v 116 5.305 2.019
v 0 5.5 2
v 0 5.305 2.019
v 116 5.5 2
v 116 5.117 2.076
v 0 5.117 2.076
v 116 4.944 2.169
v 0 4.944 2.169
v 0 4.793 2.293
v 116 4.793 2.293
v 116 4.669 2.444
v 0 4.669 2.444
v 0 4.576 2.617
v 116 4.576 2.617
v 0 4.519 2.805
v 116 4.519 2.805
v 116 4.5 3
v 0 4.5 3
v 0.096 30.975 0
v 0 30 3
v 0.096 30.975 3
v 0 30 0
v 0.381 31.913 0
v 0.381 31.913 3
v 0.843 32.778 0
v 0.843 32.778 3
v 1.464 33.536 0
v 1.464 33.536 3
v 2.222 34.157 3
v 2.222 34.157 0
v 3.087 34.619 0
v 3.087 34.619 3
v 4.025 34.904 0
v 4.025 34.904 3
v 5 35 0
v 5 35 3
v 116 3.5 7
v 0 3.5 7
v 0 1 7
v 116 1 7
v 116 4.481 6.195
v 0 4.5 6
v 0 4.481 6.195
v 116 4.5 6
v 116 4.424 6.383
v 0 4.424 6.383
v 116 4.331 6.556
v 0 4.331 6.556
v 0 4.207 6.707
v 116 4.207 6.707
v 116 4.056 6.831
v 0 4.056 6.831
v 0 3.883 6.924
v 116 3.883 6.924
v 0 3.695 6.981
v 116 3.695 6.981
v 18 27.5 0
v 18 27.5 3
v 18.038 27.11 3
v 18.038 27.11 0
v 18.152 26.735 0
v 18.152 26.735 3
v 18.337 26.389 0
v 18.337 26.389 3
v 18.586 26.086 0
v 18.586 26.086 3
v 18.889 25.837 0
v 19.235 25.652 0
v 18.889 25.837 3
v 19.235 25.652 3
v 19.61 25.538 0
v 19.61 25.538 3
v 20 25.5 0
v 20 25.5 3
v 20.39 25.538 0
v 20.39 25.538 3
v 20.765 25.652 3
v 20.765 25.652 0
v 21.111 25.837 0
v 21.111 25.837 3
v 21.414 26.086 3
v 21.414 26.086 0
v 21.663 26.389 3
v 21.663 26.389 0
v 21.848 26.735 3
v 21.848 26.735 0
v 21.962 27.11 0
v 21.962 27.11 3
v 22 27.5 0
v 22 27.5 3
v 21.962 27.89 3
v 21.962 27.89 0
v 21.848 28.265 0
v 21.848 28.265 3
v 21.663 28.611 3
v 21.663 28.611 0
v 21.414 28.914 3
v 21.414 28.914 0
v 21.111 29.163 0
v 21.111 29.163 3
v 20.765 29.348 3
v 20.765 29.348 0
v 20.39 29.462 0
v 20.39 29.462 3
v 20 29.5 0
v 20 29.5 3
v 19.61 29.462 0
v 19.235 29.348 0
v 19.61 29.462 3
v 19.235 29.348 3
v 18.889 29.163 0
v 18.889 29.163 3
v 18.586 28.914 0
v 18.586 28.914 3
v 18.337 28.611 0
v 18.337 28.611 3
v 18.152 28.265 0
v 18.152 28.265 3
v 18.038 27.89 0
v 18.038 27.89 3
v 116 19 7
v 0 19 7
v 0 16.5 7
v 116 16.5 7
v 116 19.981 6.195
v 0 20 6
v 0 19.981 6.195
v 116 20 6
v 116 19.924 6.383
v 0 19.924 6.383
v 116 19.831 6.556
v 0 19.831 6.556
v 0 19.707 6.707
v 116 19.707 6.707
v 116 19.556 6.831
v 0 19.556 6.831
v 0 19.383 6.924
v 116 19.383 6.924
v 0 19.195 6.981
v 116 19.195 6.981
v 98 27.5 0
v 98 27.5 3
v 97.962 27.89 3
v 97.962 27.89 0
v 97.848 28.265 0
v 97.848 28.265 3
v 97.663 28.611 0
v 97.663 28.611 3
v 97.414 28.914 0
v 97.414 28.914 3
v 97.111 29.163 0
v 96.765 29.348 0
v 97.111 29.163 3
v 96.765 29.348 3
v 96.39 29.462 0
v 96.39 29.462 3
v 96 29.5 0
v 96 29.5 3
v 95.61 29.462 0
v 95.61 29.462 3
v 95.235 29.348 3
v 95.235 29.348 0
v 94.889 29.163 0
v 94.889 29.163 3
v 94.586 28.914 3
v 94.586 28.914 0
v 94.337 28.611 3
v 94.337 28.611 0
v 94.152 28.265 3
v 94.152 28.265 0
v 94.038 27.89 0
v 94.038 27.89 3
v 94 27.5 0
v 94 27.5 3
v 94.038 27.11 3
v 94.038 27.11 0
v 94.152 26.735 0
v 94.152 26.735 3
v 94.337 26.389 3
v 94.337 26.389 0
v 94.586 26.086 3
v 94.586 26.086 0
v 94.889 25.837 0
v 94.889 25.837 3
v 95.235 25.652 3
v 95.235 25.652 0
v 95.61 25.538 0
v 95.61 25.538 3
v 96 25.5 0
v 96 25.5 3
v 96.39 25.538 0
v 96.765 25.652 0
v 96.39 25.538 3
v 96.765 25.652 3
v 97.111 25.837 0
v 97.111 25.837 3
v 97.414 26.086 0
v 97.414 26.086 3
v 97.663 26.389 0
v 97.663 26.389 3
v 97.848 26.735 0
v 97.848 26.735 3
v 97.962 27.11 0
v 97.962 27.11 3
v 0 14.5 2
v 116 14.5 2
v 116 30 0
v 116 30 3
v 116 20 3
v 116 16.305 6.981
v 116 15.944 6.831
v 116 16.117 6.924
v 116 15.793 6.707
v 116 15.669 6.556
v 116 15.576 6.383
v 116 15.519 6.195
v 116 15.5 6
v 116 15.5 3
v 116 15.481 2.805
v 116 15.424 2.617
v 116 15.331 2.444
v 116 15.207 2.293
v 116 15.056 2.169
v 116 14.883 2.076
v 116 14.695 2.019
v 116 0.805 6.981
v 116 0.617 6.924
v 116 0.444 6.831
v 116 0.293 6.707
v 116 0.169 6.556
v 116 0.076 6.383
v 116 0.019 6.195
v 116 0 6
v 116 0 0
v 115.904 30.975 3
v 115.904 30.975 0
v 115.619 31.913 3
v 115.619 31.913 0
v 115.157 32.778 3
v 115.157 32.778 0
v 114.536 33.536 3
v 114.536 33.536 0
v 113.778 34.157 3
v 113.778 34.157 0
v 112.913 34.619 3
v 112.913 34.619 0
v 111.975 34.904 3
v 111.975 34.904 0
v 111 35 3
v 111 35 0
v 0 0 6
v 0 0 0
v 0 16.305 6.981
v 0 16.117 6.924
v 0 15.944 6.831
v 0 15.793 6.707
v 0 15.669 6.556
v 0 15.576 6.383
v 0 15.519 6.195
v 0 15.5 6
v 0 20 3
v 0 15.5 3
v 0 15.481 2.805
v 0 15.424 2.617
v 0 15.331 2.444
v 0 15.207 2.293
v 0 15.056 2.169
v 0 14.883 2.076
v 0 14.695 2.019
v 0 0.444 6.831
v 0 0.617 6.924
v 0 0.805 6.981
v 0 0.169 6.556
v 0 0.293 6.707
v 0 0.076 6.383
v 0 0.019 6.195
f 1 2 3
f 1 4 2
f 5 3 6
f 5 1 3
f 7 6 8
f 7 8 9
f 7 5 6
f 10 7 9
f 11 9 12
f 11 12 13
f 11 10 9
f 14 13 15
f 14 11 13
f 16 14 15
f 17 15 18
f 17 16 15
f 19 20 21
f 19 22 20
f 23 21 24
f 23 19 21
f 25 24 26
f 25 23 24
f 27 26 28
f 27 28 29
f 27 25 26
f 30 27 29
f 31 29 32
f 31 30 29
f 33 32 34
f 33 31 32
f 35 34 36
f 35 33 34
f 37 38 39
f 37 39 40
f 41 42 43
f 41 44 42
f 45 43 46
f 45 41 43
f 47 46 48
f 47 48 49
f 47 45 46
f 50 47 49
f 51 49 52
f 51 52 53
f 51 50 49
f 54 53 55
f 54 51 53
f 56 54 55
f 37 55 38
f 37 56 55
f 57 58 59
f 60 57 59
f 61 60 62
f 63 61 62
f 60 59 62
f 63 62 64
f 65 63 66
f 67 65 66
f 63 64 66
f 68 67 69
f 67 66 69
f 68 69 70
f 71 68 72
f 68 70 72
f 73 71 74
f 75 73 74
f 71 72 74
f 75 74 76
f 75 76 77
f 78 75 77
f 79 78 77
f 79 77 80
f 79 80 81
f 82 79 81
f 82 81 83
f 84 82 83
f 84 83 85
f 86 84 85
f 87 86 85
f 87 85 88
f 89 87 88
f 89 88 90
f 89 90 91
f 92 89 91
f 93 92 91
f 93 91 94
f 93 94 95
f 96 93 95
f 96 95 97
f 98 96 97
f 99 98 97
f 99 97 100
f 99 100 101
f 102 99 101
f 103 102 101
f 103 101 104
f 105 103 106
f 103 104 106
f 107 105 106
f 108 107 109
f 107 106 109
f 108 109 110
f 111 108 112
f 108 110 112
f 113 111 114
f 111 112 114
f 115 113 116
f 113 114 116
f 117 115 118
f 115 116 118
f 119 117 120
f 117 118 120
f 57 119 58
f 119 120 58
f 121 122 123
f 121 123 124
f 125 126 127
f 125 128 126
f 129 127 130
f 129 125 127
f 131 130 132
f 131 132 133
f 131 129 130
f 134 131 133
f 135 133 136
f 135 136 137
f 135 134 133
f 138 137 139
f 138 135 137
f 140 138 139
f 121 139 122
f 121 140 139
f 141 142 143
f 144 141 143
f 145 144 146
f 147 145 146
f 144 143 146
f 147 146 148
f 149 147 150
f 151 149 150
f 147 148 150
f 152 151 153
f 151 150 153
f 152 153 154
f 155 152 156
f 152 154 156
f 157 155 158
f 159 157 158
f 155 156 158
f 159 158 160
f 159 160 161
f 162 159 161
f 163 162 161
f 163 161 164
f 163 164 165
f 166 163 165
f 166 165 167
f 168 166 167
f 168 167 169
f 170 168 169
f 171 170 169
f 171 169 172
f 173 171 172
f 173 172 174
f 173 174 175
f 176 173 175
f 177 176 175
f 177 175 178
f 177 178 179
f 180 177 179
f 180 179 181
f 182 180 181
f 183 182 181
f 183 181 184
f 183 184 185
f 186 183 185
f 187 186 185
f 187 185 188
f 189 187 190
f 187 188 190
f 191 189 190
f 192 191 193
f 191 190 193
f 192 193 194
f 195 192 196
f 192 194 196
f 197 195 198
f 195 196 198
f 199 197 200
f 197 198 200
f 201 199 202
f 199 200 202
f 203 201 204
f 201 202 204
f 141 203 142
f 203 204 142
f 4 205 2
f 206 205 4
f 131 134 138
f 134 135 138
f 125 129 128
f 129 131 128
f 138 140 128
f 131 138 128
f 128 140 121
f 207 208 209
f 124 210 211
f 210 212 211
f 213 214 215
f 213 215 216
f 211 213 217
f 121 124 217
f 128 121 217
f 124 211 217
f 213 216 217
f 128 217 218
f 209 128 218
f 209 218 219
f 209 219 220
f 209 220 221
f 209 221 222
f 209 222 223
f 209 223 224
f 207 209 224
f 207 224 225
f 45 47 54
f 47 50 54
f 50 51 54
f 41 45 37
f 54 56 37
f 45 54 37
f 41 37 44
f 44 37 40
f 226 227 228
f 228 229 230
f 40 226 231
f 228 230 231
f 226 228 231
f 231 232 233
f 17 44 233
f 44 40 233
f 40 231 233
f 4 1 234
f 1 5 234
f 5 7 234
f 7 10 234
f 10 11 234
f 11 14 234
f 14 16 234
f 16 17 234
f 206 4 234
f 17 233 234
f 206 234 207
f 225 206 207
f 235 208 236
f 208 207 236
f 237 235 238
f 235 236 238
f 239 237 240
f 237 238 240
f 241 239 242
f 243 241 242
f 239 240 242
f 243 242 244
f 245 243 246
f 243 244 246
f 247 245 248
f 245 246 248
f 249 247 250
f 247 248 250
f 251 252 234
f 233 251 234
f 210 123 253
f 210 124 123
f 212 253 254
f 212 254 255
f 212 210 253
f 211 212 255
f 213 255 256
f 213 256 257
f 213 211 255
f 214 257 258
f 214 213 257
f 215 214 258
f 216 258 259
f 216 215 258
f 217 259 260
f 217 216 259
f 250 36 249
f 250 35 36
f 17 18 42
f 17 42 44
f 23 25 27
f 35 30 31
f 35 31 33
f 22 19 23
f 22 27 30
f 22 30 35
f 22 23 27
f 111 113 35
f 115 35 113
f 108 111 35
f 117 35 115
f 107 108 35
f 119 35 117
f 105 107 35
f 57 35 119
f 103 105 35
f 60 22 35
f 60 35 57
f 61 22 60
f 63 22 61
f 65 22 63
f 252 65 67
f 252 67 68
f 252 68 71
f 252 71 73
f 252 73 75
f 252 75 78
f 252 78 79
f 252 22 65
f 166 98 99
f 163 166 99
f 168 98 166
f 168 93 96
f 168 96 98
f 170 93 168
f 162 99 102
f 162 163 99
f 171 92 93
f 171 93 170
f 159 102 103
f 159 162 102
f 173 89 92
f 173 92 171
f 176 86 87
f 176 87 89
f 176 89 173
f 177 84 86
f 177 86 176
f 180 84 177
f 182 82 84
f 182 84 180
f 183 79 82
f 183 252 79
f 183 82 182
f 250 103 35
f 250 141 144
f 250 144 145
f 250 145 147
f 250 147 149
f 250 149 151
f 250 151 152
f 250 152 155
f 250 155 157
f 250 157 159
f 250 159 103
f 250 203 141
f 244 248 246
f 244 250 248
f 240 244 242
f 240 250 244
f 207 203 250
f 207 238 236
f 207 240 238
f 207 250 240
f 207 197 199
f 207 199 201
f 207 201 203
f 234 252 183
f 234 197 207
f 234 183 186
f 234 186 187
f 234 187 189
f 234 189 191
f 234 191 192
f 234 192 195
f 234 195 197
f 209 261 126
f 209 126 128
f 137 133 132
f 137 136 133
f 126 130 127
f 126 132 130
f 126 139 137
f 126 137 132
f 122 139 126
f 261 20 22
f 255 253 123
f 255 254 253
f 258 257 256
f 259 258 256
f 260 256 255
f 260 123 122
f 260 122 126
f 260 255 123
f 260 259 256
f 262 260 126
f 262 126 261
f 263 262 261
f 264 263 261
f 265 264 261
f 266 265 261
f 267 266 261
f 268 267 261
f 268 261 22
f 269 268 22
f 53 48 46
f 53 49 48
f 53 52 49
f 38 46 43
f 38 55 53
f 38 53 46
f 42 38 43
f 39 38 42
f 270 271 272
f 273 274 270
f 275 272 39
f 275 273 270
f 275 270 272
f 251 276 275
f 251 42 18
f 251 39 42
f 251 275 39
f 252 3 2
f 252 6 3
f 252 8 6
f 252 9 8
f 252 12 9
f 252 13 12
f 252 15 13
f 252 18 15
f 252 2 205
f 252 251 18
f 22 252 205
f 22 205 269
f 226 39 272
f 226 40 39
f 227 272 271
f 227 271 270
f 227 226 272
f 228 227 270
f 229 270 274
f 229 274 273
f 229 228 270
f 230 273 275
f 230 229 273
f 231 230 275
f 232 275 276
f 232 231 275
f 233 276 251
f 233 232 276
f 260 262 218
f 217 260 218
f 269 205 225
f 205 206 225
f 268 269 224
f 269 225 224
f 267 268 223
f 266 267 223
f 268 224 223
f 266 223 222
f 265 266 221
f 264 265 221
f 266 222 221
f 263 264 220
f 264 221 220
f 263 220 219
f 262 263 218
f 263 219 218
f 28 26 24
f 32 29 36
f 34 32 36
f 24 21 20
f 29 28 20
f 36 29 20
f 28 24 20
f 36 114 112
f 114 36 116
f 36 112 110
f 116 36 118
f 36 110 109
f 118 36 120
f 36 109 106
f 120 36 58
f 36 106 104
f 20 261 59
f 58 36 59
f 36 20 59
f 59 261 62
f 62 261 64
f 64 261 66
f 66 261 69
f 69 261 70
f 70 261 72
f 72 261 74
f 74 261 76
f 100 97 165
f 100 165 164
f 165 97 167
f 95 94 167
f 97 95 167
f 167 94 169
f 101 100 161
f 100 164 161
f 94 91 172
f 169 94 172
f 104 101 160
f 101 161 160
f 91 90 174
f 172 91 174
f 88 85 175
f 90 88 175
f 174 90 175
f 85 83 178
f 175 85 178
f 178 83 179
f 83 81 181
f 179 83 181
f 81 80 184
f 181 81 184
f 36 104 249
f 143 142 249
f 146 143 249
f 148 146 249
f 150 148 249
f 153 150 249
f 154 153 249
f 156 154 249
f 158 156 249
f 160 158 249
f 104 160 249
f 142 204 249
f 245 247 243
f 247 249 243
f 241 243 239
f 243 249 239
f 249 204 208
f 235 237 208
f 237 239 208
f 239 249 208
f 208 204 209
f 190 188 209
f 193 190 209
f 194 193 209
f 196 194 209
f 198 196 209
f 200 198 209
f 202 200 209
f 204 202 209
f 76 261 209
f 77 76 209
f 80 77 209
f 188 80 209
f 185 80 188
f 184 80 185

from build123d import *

# Parameters (mm, degrees)
SKETCH1_W           = 116
SKETCH1_H           = 20
BOSS_EXTRUDE1_DEPTH = 2
SKETCH2_W           = 116
SKETCH2_H           = 4.5
BOSS_EXTRUDE2_DEPTH = 5
FILLET1_R           = 1
SKETCH3_W           = 116
SKETCH3_H           = 3
BOSS_EXTRUDE3_DEPTH = 15
FILLET2_R           = 5
SKETCH4_R           = 2
CUT_EXTRUDE1_DEPTH  = 15


with BuildPart() as part:
    # Sketch1 → Boss-Extrude1 (new body)
    with BuildSketch(Plane.XY):
        with Locations((58, 10)):
            Rectangle(SKETCH1_W, SKETCH1_H)
    extrude(amount=BOSS_EXTRUDE1_DEPTH)

    # Sketch2 → Boss-Extrude2 (add)
    with BuildSketch(Plane.XY.offset(2)):
        with Locations((58, 17.75)):
            Rectangle(SKETCH2_W, SKETCH2_H)
        with Locations((58, 2.25)):
            Rectangle(SKETCH2_W, SKETCH2_H)
    extrude(amount=BOSS_EXTRUDE2_DEPTH)

    # Fillet1
    fillet1_edges = [part.edges().sort_by_distance(p)[0] for p in [
        (58, 15.5, 2),
        (58, 15.5, 7),
        (58, 20, 7),
        (58, 4.5, 2),
        (58, 0, 7),
        (58, 4.5, 7),
    ]]
    fillet(fillet1_edges, radius=FILLET1_R)

    # Sketch3 → Boss-Extrude3 (add)
    with BuildSketch(Plane(origin=(0, 20, 0), x_dir=(1, 0, 0), z_dir=(0, 1, 0))):
        with Locations((58, -1.5)):
            Rectangle(SKETCH3_W, SKETCH3_H)
    extrude(amount=BOSS_EXTRUDE3_DEPTH)

    # Fillet2
    fillet2_edges = [part.edges().sort_by_distance(p)[0] for p in [
        (0, 35, 1.5),
        (116, 35, 1.5),
    ]]
    fillet(fillet2_edges, radius=FILLET2_R)

    # Sketch4 → Cut-Extrude1 (cut)
    with BuildSketch(Plane.XY.offset(3)):
        with Locations((96, 27.5)):
            Circle(SKETCH4_R)
        with Locations(Location((20, 27.5, 0), (0, 0, 180))):
            Circle(SKETCH4_R)
    extrude(amount=-CUT_EXTRUDE1_DEPTH, mode=Mode.SUBTRACT)


solid = part.part
